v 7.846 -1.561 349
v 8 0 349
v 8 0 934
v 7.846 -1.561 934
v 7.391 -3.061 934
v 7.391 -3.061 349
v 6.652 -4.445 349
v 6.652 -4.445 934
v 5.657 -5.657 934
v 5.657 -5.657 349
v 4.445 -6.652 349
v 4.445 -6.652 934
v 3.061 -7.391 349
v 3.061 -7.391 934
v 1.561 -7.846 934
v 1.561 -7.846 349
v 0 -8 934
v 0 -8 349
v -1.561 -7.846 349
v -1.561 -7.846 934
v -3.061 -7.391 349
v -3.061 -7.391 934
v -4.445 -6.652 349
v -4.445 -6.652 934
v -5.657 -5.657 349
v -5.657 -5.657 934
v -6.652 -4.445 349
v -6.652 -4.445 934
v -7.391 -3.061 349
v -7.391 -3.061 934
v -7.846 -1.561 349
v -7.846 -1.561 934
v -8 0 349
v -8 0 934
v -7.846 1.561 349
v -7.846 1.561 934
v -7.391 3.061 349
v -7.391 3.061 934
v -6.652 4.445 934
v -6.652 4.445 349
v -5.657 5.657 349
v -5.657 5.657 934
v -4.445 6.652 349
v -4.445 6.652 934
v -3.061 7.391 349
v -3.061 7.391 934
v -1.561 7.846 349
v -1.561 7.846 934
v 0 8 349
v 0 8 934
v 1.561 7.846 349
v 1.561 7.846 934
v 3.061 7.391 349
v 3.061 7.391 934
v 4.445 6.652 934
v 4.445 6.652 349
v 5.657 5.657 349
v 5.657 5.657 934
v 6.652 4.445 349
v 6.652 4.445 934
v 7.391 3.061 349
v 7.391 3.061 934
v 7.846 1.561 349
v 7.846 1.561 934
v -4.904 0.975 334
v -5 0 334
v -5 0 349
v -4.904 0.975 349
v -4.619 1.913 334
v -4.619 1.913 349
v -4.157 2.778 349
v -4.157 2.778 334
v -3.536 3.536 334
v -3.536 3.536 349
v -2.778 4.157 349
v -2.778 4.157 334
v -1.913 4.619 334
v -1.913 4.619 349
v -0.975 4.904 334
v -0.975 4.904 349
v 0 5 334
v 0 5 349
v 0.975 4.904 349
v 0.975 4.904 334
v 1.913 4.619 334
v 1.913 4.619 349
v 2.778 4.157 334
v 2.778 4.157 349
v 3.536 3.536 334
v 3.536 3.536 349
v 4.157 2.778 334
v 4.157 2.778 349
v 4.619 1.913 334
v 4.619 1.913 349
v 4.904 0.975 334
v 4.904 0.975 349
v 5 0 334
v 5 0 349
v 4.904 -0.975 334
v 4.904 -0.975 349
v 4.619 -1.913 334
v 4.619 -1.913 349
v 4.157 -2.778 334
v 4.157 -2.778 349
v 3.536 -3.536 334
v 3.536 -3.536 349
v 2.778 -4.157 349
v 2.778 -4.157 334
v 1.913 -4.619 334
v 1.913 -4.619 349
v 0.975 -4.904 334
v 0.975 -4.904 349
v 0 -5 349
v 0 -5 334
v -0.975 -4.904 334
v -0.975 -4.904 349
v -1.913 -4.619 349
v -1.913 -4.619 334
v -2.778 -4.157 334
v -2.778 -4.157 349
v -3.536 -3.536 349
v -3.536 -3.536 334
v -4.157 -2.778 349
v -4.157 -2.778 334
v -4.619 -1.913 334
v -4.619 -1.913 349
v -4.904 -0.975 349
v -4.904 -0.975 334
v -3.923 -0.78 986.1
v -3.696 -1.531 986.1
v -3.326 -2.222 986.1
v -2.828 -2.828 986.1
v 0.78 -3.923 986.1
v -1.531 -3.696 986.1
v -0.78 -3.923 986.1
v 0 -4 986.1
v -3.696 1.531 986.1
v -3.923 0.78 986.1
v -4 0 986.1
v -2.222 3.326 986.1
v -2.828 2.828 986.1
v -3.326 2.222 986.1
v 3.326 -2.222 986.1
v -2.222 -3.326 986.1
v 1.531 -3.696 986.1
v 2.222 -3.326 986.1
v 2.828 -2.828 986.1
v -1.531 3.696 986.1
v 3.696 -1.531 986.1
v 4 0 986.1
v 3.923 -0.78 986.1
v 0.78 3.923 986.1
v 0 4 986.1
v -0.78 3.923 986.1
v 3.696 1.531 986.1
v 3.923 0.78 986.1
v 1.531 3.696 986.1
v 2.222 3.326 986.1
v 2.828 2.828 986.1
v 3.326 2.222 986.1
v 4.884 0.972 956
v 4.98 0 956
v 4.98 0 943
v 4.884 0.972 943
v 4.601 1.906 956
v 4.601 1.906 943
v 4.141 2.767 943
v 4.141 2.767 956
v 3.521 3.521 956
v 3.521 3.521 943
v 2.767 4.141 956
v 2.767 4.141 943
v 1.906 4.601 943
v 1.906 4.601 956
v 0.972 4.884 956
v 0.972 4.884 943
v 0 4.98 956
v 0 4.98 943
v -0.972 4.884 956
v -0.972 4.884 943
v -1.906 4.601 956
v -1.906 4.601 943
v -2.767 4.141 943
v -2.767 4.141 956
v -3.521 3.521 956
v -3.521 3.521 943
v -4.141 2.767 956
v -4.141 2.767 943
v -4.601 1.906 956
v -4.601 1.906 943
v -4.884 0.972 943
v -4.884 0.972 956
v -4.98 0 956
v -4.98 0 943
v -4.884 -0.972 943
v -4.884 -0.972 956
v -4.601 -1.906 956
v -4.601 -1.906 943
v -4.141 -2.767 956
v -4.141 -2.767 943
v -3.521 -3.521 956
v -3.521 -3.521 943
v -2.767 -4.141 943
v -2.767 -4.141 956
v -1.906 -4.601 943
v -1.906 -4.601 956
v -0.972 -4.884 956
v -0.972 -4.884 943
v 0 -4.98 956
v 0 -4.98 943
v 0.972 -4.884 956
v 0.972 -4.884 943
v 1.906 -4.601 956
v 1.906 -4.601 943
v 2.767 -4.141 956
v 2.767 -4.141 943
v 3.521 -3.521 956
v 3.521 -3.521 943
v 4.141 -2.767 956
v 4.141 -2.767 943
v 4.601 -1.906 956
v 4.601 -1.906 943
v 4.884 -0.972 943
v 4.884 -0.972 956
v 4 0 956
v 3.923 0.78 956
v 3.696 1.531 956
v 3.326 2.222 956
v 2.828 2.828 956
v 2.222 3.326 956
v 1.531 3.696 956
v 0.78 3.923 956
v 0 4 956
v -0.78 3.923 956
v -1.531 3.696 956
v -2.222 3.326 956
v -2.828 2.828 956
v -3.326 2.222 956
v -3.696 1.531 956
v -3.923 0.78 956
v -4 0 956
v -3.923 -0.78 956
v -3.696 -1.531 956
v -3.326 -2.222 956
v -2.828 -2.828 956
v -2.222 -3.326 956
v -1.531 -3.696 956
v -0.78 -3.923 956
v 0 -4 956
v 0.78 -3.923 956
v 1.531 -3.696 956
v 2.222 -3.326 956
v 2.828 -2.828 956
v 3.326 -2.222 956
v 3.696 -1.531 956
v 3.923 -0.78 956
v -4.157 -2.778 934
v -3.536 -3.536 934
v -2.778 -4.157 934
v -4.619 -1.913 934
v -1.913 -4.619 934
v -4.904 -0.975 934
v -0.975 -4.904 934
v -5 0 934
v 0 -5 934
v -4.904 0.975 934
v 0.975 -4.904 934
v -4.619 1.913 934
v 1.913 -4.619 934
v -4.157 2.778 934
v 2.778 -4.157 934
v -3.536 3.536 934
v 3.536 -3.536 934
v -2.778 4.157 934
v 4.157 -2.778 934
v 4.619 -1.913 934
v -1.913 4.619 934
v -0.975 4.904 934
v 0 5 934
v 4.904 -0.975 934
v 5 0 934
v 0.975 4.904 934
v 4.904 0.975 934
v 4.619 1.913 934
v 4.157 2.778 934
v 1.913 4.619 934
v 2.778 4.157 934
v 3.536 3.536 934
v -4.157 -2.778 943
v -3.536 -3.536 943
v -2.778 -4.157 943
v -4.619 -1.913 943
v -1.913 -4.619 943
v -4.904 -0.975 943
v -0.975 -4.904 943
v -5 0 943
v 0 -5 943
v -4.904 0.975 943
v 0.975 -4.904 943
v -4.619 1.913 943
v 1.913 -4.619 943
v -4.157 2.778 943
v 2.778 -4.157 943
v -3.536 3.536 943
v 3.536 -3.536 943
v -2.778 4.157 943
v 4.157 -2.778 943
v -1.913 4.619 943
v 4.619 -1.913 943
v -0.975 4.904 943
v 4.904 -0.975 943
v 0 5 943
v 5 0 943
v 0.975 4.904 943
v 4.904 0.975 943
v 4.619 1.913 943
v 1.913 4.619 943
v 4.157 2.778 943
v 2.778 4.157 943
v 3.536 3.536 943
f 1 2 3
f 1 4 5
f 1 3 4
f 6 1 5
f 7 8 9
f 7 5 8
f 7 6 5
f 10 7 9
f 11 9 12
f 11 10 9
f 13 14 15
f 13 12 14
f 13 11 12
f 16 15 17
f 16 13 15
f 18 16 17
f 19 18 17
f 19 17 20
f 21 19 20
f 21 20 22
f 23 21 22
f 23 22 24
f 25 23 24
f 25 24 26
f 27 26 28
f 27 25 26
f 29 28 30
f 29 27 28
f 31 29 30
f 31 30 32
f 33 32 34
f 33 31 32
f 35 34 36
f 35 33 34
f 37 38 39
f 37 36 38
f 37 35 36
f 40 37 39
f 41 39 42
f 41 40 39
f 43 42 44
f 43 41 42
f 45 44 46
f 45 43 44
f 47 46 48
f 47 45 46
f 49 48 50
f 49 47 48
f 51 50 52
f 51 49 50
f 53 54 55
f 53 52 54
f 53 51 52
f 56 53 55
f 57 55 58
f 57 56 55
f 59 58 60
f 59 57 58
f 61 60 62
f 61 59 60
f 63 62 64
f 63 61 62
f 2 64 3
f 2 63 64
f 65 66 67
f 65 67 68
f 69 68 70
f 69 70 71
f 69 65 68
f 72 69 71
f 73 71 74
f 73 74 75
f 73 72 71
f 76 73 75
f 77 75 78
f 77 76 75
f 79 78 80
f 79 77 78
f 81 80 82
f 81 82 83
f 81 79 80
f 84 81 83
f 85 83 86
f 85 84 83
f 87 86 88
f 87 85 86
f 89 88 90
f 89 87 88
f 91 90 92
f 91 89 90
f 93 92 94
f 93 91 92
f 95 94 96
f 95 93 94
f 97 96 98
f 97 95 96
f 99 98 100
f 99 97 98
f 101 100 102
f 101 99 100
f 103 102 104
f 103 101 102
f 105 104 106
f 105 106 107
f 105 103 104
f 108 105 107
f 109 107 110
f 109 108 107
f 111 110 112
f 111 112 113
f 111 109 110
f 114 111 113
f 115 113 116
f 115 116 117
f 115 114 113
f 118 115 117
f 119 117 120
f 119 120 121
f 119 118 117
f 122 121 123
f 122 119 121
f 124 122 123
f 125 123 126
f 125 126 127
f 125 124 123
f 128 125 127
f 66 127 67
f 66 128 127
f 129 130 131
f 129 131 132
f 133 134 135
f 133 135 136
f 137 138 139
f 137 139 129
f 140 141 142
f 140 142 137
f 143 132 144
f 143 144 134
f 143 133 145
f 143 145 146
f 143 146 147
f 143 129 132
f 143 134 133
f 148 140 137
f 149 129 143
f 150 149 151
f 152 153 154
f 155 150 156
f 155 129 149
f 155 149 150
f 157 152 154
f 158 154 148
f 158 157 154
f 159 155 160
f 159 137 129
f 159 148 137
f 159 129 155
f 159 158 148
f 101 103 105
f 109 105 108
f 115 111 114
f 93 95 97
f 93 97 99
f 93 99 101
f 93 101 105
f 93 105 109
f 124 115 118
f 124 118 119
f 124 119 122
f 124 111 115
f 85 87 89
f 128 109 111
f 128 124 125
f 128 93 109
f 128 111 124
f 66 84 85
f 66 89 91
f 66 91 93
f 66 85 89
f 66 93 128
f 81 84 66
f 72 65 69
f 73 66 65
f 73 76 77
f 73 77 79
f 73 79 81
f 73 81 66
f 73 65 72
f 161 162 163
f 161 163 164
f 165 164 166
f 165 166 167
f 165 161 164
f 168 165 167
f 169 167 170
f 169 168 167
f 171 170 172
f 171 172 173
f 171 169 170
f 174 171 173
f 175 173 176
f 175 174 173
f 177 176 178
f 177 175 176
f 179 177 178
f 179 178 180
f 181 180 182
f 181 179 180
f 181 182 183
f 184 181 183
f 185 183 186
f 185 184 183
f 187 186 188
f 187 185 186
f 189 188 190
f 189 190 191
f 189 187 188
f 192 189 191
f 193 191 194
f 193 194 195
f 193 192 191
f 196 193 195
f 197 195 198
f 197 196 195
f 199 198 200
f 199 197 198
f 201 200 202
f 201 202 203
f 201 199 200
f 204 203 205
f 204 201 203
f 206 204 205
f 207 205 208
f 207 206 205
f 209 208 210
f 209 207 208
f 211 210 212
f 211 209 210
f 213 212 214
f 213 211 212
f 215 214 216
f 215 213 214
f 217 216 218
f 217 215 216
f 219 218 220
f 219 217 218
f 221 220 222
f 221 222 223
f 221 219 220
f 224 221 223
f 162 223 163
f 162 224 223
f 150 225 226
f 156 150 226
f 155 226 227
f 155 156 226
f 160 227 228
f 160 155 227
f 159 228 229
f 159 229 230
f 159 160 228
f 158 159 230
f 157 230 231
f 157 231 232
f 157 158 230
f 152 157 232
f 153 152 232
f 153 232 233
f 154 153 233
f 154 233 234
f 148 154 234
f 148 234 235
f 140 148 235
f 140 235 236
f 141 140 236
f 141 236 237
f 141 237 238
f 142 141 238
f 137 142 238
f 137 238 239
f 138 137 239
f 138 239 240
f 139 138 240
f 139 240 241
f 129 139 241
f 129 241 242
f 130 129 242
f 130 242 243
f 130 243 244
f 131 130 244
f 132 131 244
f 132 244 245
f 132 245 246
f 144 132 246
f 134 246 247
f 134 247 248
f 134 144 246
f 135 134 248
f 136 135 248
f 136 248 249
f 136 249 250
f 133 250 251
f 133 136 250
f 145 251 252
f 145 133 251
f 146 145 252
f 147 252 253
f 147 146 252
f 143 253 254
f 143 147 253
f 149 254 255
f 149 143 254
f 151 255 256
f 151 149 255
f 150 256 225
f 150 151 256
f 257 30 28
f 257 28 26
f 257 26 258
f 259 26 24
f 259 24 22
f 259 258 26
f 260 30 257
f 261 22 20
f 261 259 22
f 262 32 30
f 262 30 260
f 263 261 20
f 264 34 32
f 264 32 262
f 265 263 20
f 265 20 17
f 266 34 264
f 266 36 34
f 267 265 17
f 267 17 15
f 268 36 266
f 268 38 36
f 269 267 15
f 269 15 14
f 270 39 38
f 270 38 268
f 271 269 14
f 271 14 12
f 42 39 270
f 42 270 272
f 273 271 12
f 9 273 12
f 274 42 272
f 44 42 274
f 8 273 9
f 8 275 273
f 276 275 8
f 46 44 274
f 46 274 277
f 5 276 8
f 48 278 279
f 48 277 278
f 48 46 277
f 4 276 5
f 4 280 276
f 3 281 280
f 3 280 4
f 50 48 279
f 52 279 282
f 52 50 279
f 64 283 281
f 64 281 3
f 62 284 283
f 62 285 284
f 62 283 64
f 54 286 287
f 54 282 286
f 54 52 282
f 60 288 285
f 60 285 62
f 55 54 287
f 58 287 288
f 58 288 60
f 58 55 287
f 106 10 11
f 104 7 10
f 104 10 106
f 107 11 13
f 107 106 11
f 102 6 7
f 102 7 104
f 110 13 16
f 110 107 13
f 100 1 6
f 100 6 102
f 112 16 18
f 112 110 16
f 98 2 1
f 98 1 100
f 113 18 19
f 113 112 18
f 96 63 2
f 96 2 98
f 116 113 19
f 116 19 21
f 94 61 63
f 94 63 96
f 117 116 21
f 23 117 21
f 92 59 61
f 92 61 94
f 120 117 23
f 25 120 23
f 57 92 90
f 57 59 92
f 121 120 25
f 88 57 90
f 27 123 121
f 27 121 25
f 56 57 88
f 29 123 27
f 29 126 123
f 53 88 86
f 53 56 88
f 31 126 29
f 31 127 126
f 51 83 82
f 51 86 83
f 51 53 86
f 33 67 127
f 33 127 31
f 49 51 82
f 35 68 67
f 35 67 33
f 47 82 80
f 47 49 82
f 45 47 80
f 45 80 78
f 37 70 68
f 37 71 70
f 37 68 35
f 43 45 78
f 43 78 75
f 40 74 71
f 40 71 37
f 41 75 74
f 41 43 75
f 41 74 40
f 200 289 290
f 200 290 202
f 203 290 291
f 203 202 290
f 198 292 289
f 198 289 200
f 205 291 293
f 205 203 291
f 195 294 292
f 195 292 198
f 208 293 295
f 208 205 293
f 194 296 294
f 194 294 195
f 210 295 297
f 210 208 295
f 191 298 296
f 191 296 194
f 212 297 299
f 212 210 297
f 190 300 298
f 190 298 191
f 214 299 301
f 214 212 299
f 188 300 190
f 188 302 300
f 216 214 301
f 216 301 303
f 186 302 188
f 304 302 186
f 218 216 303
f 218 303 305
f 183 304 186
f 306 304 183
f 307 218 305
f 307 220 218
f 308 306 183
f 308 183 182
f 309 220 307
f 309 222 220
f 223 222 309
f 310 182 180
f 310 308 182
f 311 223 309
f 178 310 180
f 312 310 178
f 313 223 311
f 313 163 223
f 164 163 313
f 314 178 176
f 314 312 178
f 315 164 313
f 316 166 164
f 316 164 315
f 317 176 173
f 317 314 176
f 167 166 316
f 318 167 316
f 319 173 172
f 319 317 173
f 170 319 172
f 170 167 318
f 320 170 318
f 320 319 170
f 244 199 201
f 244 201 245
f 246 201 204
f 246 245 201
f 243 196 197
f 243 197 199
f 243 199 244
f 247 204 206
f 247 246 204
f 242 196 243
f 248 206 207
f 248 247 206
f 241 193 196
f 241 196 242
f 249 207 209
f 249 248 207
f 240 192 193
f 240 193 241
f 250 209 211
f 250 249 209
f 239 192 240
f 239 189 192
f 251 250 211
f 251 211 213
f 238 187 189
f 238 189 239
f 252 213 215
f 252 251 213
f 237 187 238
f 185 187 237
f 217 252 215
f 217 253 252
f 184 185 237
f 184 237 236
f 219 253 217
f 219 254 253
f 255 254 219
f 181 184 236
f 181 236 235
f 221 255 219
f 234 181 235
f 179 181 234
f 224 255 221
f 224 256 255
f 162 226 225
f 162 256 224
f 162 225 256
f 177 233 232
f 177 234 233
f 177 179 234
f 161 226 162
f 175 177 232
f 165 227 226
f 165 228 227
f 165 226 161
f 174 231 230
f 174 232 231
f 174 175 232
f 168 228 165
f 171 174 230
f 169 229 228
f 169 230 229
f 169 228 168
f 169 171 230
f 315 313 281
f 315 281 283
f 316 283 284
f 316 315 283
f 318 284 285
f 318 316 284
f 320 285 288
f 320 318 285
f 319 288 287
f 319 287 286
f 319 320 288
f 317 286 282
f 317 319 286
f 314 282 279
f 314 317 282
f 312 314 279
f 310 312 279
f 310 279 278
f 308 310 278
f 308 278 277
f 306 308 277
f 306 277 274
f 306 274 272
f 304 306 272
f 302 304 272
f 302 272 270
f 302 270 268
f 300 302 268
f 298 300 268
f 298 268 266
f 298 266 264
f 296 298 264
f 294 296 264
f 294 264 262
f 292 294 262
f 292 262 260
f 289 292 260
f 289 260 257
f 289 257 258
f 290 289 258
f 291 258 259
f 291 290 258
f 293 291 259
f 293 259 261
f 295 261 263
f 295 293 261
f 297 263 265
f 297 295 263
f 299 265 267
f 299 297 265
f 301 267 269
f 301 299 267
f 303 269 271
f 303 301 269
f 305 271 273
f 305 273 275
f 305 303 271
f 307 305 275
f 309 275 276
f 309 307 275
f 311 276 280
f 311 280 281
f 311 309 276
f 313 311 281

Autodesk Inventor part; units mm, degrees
ref_plane "YZ Plane" through (0, 0, 0) normal (1, 0, 0) x (0, 1, 0)
ref_plane "XZ Plane" through (0, 0, 0) normal (0, 1, 0) x (-1, 0, 0)
ref_plane "XY Plane" through (0, 0, 0) normal (0, 0, 1) x (1, 0, 0)
sketch "Szkic1" plane through (0, 0, 0) normal (0, 0, 1) x (1, 0, 0)
  circle A0 centre (0, 0) radius 8
  dimension "d0" = 16
extrude "Wyciągnięcie proste2" add sketch "Szkic1" along normal blind 1000
sketch "Szkic2" plane through (0, 0, 1000) normal (0, 0, 1) x (1, 0, 0)
  circle A0 centre (0, 0) radius 4
  circle A1 centre (0, 0) radius 8 projected
  dimension "d7" = 8
extrude "Wyciągnięcie proste3" cut sketch "Szkic2" against normal blind 30
sketch "Szkic3" plane through (0, 0, 970) normal (0, 0, 1) x (1, 0, 0)
  circle A0 centre (0, 0) radius 8 projected
  circle A1 centre (0, 0) radius 5
  dimension "d10" = 10
extrude "Wyciągnięcie proste4" cut sketch "Szkic3" against normal blind 30
sketch "Szkic4" plane through (0, 0, 970) normal (0, 0, 1) x (1, 0, 0)
  circle A0 centre (0, 0) radius 5 projected
  circle A1 centre (0, 0) radius 4.98
  dimension "d13" = 9.96
extrude "Wyciągnięcie proste5" cut sketch "Szkic4" against normal blind 27
sketch "Szkic5" plane through (0, 0, 0) normal (0, 0, -1) x (-1, 0, 0)
  circle A0 centre (0, 0) radius 5
  circle A1 centre (0, 0) radius 8 projected
  dimension "d18" = 10
extrude "Wyciągnięcie proste6" cut sketch "Szkic5" against normal blind 20
thread "Gwint3" size "TR16x4" class "7e" standard "ISO Metric Trapezoidal Threads" full length
sketch "Szkic6" plane through (0, 0, 20) normal (0, 0, -1) x (-1, 0, 0)
  circle A0 centre (0, 0) radius 5 projected
  circle A1 centre (0, 0) radius 8 projected
extrude "Wyciągnięcie proste7" cut sketch "Szkic6" against normal blind 329
sketch "Szkic7" plane through (0, 0, 0) normal (0, 0, -1) x (-1, 0, 0)
  circle A0 centre (0, 0) radius 5 projected
extrude "Wyciągnięcie proste8" cut sketch "Szkic7" against normal blind 334
sketch "Szkic8" plane through (0, 0, 940) normal (0, 0, 1) x (1, 0, 0)
  circle A0 centre (0, 0) radius 5 projected
  circle A1 centre (0, 0) radius 8 projected
extrude "Wyciągnięcie proste9" cut sketch "Szkic8" against normal blind 6
sketch "Szkic9" plane through (0, 0, 970) normal (0, 0, 1) x (1, 0, 0)
  circle A0 centre (0, 0) radius 4.98 projected
  circle A1 centre (0, 0) radius 4 projected
extrude "Wyciągnięcie proste10" cut sketch "Szkic9" against normal blind 14
thread "Gwint4" size "M10x1.5" class "6g" standard "ANSI Metric M Profile" full length
sketch "Szkic10" plane through (0, 0, 1000) normal (0, 0, 1) x (1, 0, 0)
  circle A0 centre (0, 0) radius 4 projected
extrude "Wyciągnięcie proste11" cut sketch "Szkic10" against normal blind 13.9
properties part number "Śruba trapezowa 16x4 - oś X"
